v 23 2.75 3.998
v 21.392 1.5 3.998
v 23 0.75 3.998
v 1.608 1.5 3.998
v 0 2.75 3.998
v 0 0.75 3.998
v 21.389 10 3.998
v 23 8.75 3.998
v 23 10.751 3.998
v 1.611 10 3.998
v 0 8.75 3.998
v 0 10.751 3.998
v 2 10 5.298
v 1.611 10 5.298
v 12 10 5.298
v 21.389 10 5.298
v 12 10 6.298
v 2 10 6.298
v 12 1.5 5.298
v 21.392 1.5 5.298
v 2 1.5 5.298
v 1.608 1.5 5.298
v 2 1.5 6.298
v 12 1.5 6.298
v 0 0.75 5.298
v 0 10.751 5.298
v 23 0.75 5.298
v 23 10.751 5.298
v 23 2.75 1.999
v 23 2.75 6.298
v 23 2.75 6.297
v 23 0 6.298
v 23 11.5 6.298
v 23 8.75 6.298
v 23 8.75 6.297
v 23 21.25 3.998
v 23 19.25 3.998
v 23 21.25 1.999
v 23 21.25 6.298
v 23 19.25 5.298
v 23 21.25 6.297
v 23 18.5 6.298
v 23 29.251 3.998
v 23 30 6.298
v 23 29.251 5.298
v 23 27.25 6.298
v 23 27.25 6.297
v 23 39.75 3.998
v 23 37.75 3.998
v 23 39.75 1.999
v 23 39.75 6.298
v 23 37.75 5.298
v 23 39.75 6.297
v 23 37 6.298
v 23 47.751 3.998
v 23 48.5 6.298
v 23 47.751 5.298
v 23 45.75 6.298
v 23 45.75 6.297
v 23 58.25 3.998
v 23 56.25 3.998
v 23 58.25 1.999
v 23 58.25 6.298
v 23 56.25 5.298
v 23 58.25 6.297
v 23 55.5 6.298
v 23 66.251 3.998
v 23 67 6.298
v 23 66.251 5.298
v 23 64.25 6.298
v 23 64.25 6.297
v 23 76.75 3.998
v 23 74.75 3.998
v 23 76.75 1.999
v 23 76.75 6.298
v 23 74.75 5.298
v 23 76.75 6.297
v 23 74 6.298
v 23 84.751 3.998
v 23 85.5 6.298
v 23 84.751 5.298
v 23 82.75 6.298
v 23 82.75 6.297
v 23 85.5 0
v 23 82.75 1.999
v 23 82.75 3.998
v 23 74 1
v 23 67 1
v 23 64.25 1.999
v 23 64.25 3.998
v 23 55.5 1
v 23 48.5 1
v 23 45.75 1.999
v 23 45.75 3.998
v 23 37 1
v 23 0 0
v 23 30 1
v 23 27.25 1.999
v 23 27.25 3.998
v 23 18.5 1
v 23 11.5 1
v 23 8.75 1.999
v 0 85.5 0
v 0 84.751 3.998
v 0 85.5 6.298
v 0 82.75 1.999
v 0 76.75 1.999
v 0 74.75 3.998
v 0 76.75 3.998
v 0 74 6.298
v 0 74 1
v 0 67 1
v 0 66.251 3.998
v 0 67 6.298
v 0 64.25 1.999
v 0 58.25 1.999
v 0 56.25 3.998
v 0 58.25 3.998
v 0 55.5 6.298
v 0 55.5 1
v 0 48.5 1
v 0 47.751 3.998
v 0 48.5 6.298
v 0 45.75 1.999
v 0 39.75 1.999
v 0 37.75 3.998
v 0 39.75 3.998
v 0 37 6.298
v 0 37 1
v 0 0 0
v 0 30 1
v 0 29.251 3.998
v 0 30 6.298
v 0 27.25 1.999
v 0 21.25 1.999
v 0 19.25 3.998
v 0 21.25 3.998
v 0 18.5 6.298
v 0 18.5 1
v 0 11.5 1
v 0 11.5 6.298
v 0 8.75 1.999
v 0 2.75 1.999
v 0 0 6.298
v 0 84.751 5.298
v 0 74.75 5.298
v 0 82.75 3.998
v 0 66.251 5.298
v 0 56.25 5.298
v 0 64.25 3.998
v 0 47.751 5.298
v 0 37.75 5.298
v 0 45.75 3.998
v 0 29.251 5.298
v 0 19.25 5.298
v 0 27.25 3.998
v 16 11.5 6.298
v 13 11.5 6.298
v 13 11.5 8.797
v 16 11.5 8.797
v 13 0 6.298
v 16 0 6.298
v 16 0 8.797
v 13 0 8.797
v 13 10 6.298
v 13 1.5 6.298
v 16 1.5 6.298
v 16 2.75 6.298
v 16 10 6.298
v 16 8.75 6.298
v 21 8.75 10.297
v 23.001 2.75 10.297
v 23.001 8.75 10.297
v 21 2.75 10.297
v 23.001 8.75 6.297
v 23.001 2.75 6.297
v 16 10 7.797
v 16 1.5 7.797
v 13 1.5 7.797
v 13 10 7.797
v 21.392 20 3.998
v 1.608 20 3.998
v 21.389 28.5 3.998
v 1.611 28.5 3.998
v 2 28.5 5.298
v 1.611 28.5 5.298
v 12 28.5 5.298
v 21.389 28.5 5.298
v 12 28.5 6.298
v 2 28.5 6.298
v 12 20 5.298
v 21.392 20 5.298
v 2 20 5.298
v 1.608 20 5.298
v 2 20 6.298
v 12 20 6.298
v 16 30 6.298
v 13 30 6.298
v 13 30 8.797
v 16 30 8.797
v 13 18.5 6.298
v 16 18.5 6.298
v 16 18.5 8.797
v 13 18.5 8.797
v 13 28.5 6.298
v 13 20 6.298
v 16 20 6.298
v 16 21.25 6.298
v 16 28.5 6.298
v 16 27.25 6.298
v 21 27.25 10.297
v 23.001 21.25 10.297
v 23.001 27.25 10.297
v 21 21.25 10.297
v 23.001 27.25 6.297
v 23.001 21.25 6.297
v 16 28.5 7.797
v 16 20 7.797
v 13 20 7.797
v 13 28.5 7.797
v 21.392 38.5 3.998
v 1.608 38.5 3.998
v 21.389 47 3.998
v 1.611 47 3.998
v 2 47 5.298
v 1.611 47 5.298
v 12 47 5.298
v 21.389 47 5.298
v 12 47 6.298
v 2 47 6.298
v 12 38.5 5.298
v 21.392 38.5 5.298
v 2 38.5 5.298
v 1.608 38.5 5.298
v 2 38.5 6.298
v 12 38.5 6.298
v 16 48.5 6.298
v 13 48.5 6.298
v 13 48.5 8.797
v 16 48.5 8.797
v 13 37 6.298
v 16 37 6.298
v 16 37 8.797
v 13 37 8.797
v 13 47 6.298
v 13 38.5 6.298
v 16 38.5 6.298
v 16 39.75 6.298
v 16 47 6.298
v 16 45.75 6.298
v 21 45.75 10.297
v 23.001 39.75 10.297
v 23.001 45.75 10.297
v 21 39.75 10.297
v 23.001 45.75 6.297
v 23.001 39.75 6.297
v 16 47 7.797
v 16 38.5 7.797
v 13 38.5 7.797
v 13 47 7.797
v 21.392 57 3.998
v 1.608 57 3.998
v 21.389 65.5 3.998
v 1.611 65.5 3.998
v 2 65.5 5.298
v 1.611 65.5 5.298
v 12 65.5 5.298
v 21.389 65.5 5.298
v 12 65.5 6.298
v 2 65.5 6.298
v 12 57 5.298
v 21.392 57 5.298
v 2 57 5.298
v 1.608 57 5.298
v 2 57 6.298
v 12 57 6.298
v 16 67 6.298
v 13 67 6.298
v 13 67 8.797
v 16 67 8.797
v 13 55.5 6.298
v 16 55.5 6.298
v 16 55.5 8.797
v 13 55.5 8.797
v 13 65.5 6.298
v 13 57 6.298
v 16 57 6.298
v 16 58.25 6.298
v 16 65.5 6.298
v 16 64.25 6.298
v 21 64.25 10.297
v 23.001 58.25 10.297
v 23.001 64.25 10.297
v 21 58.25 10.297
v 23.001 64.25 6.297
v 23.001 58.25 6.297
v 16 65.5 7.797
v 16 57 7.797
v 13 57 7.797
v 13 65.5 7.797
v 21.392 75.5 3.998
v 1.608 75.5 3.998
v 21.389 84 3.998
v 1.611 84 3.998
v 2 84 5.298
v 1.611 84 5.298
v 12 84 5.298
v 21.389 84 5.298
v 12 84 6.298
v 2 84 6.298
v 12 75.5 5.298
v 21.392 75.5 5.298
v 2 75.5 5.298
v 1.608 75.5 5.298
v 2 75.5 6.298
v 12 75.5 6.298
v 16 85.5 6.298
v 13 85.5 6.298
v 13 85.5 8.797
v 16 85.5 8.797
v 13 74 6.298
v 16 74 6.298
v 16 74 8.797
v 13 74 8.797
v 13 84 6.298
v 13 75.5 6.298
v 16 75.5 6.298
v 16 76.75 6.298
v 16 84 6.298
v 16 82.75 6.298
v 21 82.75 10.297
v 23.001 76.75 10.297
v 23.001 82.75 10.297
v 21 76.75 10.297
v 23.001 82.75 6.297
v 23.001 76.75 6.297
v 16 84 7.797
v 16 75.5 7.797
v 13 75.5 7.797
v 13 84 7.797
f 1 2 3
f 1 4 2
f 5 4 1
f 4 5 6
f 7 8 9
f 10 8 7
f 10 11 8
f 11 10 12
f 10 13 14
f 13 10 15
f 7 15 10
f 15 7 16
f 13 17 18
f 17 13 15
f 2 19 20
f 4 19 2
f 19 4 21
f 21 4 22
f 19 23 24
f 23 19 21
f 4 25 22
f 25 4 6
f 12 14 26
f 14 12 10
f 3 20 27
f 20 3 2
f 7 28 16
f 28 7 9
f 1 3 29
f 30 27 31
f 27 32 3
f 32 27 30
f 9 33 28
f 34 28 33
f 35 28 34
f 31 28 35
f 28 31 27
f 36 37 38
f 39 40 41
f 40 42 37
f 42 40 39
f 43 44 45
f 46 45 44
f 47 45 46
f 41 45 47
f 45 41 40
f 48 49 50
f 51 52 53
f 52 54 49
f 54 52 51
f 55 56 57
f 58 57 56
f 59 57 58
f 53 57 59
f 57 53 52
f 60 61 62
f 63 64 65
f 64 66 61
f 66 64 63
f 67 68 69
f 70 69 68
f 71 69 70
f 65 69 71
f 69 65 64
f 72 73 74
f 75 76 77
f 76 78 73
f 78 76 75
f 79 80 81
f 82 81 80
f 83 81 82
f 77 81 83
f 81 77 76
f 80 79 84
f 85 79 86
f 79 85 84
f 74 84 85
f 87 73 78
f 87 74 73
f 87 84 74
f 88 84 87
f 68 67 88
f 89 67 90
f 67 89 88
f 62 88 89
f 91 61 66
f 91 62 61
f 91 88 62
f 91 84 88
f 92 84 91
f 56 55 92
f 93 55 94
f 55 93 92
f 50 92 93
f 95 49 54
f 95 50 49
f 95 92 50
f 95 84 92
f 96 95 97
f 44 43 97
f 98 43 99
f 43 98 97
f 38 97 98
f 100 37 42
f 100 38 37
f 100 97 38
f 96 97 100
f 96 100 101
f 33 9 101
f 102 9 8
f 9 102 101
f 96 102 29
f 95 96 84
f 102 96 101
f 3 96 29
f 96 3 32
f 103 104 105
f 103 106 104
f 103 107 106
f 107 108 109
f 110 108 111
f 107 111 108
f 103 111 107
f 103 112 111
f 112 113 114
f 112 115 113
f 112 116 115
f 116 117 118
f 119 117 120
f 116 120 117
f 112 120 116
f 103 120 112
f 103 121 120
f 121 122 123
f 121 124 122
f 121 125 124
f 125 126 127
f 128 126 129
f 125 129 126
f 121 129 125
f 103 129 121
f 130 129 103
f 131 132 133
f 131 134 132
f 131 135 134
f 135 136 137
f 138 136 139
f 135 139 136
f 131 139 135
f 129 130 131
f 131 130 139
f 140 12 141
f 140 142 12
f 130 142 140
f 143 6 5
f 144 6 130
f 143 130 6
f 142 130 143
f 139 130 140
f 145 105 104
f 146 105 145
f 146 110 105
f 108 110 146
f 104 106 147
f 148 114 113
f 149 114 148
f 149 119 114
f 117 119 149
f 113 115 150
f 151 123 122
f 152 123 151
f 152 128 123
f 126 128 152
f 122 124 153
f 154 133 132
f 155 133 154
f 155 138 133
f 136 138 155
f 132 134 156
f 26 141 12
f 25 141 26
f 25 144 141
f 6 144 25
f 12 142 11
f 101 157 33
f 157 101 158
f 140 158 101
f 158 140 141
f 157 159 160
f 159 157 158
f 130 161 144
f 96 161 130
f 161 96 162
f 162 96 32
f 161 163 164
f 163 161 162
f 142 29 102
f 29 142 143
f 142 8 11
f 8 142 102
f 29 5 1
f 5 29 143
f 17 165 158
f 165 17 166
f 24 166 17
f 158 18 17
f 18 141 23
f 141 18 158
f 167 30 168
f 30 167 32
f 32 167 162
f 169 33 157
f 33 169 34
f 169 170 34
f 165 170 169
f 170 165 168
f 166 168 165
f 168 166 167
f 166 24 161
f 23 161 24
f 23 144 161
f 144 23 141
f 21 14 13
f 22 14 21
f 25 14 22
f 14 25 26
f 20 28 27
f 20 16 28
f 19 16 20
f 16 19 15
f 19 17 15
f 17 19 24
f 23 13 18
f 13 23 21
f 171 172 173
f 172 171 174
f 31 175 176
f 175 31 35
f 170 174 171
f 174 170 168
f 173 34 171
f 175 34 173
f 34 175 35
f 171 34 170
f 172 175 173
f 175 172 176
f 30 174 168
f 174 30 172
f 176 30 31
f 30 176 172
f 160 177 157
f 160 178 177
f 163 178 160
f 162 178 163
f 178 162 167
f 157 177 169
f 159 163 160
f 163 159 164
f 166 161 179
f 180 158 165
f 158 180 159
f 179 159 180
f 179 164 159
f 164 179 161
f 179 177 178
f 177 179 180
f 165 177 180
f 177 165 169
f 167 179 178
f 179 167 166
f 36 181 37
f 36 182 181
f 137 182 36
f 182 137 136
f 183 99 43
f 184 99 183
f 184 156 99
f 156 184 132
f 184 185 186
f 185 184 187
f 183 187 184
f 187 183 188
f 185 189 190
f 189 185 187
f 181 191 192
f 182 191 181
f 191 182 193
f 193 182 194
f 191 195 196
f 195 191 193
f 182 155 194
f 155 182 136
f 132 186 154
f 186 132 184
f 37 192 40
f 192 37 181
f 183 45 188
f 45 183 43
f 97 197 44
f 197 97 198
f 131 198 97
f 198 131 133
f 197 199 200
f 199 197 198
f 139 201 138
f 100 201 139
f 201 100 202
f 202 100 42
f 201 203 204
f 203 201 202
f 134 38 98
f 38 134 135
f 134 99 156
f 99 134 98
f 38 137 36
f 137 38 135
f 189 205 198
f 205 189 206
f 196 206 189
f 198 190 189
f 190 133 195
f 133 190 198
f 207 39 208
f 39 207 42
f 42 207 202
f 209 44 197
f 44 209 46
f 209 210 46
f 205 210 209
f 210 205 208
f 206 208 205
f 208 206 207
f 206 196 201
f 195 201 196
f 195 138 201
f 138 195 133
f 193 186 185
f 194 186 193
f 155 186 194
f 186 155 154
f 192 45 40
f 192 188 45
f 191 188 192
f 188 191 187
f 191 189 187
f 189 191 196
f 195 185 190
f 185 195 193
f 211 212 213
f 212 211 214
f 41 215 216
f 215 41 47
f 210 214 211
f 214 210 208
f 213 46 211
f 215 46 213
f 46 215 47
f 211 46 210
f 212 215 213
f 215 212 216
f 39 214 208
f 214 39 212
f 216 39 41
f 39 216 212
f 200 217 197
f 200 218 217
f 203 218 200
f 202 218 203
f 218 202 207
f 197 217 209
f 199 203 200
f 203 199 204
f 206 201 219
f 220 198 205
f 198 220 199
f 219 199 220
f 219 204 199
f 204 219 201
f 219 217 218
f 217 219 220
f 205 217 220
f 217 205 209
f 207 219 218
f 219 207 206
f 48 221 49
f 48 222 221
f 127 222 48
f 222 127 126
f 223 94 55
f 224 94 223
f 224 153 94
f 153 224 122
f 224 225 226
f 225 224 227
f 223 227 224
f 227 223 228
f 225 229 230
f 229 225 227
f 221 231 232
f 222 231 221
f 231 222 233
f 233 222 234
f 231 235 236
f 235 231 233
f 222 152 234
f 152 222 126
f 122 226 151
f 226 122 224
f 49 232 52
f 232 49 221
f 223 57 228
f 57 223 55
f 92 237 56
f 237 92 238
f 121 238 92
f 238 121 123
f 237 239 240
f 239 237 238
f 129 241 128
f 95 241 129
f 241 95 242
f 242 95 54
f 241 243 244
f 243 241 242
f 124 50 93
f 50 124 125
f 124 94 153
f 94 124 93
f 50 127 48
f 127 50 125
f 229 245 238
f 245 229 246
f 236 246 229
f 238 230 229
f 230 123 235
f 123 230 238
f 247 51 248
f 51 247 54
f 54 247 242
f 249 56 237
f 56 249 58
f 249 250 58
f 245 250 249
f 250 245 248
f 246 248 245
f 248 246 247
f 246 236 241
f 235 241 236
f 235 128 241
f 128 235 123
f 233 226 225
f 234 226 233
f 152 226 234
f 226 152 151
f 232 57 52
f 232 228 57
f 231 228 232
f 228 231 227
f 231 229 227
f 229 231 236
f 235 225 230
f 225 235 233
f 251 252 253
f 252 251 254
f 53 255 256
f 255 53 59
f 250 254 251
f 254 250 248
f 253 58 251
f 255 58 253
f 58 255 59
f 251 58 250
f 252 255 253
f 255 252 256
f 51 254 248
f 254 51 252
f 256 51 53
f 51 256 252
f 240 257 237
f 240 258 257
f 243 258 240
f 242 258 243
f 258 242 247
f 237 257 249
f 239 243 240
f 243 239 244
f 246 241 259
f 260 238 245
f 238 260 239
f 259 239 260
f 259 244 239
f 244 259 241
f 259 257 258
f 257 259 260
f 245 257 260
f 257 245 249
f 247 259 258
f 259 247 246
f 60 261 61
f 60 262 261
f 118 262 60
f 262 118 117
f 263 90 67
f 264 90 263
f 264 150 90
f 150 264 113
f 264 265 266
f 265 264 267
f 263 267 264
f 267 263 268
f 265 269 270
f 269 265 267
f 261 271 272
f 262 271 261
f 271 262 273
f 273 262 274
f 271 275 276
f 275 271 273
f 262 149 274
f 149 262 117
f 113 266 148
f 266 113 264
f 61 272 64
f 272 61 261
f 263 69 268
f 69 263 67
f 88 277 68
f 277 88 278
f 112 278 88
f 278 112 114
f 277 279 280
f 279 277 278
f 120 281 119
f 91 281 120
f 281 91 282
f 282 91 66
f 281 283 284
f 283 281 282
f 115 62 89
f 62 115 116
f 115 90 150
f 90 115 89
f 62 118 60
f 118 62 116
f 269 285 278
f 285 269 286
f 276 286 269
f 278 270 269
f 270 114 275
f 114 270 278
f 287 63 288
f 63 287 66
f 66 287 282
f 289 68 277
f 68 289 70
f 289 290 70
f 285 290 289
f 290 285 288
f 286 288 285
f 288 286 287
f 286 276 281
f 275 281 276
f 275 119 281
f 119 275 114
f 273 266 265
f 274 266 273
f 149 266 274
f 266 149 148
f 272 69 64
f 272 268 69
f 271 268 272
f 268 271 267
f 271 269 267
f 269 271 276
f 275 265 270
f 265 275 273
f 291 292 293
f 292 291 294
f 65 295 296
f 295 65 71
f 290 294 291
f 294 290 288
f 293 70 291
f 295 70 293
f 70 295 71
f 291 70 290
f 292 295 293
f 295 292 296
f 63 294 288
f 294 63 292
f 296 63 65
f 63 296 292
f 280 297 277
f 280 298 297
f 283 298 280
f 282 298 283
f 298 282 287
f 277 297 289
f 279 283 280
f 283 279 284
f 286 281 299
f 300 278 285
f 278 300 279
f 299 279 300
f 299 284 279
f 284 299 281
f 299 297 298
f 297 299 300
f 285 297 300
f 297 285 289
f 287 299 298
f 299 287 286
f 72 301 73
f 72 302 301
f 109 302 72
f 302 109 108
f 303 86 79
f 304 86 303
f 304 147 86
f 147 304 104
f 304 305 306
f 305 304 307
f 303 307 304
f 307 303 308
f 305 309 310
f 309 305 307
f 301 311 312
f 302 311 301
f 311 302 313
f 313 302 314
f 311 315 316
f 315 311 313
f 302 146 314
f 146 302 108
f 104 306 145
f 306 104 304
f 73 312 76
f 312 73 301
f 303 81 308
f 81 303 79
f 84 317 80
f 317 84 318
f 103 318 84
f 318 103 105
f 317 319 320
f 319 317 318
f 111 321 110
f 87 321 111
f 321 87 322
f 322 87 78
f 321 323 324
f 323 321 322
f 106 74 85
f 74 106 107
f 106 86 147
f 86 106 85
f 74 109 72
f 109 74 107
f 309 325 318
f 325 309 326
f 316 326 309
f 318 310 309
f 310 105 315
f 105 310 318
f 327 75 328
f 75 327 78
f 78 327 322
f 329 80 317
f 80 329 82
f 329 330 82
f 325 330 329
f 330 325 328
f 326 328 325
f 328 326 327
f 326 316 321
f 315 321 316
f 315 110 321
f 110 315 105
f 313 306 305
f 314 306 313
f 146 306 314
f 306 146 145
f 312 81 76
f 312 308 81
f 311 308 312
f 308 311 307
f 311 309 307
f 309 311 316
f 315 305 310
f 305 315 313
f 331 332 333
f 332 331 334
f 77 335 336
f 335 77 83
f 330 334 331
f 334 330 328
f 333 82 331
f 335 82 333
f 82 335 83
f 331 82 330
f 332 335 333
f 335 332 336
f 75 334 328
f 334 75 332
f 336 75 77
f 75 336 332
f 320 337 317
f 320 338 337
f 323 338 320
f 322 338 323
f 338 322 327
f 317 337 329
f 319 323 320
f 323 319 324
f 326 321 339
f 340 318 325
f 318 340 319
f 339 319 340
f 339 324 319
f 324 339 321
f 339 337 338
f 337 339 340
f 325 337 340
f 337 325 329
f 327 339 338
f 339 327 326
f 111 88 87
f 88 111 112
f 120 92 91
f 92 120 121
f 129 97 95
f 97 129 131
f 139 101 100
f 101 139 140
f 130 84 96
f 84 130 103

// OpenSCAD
// TODO: cleanup.

/* [Global] */

// Overall length.
total_length = 23;  

// Thickness of side walls.
side_wall_width = 1.5;

// Thickness of the bottom.
bottom_thickness = 1; 
// Thickness of the top.
top_thickness = 1;

// Length of the part picking hole.
top_hole_length = 10;
// Offset of the part picking hole from the part's end.
top_hole_offset = 2;

// Width of the tape slot (tape width + margin).
tape_slot_width = 8.5;
// Height of the tape slot (tape thickness + margin)
tape_slot_height = 1.3;

// Width of the slot below the tape.
part_slot_width = 6;
// Height of the slot below the tape.
part_slot_height = 2;
// Taper angle at the tape entry and exit ends.
part_slot_taper_angle = 25;

// Height below the tape peeling bridge.
bridge_gap = 1.5;
// Width of the tape peeling bridge.
bridge_width = 3;
// Thickness of the tape peeling bridge top.
bridge_top_thickness = 1;

bridge_height = bridge_gap + bridge_top_thickness;

// Width of the tape peeling ramp. 
ramp_width = 6;
// Height of the tape peeling ramp.
ramp_height = 4;
// Horizontal length of the tape peeling ramp.
ramp_length = 5;
// Extra length at the high end of the ramp.
ramp_tail_length = 2;
// Ramp offset from the part end.
ramp_offset = 16;
// Thickness of the plate that connects feeders.
plate_thickness = 1;
// Number of feeders.
array_size = 5;
// Spacing between feeders.
inter_unit_space = 7;

/* [Hidden] */

base_length = total_length;
base_height = bottom_thickness + part_slot_height + tape_slot_height;
base_width = tape_slot_width + 2*side_wall_width;

eps1 = 0.001;
eps2 = 2*eps1;

module tape_slot_taper(x, y, a) {
  translate([x, y, 0])
  rotate([0, 0, a])
  translate([-3*side_wall_width/2, 0, 0])  cube([3*side_wall_width, eps1, tape_slot_height+eps2]);
}

module base_body() {
  cube([base_length, base_width, base_height]);
}

module parts_slot() {
 translate([-eps1, (base_width-part_slot_width)/2, 0]) 
    cube([base_length+eps2, part_slot_width, part_slot_height]);  
}

module tape_slot() {
 a = part_slot_taper_angle;
 translate([-eps1, (base_width-tape_slot_width)/2, 0]) cube([base_length+eps2, tape_slot_width, tape_slot_height+eps2]);

 hull() {
  tape_slot_taper(0,  side_wall_width/2, a);
  tape_slot_taper(0, base_width - side_wall_width/2, -a);
 }

 hull() {
 tape_slot_taper(total_length, side_wall_width/2, -a);
 tape_slot_taper(total_length, base_width - side_wall_width/2, a);
 }
}


module base_main() {
  difference() {
    base_body();
    translate([0, 0, bottom_thickness]) parts_slot();
    translate([0, 0, bottom_thickness+part_slot_height-eps1]) tape_slot();
  }
}

module top_ramp() {
  translate([0, (base_width-ramp_width)/2, 0]) hull() {
    cube([eps1, ramp_width, eps1]);
    translate([ramp_length, 0, 0])  cube([eps1, ramp_width, ramp_height]);
    translate([ramp_length+ramp_tail_length, 0, 0])  cube([eps1, ramp_width, ramp_height]);

  }
}

module top_hole(x, l, w) {
  translate([x, (base_width-w)/2, -eps1]) cube([l, w, top_thickness + eps2]);
}

module bridge_main() {
  difference() {
    cube([bridge_width, base_width, bridge_gap + bridge_top_thickness]);
    translate([-eps1, (base_width - tape_slot_width)/2, -eps1]) cube([bridge_width+eps2, tape_slot_width, bridge_gap+eps1]);
}
}

module top_main() {
  difference() {
  cube([base_length, base_width, top_thickness]);
  top_hole(top_hole_offset, top_hole_length, tape_slot_width);
}
  translate([ramp_offset, 0, top_thickness - eps1]) top_ramp();
}

// For printing without material support. Requires gluing of the three parts.
module disassembled_unit() {
  base_main();
  translate([0, -base_width * 1.2, 0]) top_main(); 
  translate([-4, 0, bridge_height]) rotate([0, 180, 0]) bridge_main();
}

module assembled_unit() {
   base_main();
   translate([0, 0, base_height-eps1]) top_main();
   translate([bridge_width + 10, 0,  base_height + top_thickness - eps2]) bridge_main();
}

module assembled_array() {
  width = array_size*base_width + (array_size-1)*inter_unit_space; 
  for ( i = [0 : array_size-1] ) {
    translate([0, i*(base_width + inter_unit_space), plate_thickness - eps1]) assembled_unit();
  }
  cube([base_length, width, plate_thickness]);
}

assembled_array();
